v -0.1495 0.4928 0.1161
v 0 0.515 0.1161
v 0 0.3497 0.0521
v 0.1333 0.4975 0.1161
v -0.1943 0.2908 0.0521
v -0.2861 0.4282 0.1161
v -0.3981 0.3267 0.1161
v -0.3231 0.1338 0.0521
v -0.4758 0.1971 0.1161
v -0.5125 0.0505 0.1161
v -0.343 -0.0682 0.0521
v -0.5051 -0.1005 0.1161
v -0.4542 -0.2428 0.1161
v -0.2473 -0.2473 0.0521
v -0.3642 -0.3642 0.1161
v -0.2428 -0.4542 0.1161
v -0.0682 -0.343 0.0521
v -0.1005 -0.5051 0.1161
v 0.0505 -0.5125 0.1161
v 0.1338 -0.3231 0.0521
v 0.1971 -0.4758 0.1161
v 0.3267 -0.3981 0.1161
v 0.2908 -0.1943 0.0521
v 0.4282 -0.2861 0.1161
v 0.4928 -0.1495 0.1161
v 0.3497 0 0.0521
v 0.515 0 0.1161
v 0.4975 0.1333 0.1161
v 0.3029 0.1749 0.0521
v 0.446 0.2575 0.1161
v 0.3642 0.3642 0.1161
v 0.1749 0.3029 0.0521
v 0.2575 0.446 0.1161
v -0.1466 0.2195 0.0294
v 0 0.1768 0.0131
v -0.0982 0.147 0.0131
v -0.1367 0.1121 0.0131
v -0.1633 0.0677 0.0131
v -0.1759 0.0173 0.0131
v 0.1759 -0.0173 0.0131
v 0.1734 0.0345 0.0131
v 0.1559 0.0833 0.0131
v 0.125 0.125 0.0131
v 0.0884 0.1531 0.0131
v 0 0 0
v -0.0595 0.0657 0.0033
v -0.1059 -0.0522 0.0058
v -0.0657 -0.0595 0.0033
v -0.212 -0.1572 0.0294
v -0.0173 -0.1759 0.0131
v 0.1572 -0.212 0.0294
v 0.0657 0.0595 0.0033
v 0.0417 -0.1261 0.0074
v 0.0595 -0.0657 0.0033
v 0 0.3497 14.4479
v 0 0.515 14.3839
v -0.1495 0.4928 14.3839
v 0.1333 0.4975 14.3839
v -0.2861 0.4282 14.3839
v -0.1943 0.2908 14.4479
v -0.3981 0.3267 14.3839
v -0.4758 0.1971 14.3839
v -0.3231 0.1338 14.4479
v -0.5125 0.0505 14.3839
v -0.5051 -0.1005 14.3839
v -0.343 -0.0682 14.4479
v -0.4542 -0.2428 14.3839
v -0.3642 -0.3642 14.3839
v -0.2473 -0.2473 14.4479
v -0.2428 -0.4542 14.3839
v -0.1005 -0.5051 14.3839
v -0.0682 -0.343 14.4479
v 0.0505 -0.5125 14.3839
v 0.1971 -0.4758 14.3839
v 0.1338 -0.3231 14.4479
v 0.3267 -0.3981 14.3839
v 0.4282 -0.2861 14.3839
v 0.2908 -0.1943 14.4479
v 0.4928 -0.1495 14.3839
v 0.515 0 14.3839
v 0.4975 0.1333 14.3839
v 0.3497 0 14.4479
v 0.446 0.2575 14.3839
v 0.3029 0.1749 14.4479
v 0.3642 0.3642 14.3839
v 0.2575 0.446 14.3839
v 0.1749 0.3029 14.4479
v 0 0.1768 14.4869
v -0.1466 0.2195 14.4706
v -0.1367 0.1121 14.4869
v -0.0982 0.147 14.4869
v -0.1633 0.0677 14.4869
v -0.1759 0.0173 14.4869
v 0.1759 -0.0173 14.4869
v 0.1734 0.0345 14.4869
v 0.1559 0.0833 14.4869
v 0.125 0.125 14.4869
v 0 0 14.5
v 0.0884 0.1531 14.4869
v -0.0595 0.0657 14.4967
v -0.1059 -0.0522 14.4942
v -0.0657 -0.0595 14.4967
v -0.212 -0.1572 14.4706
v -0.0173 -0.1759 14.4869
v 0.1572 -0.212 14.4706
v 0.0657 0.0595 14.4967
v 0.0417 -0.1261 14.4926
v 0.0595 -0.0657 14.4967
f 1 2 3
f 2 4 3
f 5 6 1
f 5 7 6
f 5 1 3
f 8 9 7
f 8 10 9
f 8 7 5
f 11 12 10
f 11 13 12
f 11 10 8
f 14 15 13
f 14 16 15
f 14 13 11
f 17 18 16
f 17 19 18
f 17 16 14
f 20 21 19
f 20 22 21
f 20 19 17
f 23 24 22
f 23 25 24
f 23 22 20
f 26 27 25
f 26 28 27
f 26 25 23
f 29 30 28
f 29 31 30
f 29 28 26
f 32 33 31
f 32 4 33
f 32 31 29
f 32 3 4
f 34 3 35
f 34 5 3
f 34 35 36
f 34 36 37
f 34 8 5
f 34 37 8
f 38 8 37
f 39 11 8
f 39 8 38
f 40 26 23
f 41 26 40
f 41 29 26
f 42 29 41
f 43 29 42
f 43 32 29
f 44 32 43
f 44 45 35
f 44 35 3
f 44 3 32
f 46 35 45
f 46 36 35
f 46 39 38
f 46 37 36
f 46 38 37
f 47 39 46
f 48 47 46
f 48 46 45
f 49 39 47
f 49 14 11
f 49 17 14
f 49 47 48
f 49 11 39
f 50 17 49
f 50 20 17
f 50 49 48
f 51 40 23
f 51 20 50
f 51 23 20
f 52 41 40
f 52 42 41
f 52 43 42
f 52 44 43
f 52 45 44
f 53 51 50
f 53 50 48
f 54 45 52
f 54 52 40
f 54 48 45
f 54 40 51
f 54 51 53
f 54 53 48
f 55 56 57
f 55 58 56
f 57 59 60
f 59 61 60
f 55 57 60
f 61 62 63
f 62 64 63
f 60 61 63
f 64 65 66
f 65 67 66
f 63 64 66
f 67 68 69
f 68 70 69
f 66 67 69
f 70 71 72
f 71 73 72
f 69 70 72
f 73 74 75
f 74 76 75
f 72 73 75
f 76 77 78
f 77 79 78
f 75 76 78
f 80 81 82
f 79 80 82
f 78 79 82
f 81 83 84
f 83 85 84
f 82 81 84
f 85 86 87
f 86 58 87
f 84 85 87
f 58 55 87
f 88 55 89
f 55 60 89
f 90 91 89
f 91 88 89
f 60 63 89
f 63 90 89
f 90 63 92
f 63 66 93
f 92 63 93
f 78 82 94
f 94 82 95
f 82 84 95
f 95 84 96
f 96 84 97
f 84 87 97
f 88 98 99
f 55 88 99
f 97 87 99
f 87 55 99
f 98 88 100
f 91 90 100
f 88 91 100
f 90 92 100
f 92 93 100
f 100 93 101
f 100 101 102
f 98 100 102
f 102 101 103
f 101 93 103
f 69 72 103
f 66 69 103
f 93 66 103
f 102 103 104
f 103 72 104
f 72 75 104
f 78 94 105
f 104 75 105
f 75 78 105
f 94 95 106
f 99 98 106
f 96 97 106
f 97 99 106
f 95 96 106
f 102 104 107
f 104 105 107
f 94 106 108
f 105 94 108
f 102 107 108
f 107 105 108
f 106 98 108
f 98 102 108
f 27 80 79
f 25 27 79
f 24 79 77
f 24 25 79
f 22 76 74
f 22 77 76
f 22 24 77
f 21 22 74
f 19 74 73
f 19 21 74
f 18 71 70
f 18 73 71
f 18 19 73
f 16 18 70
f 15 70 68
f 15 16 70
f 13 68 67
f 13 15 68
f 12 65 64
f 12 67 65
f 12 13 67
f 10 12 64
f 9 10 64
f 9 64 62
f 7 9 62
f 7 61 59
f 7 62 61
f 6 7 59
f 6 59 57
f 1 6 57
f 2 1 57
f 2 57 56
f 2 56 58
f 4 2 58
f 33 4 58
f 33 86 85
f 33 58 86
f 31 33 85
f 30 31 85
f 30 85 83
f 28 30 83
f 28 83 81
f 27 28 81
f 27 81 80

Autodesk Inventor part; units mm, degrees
ref_plane "YZ Plane" through (0, 0, 0) normal (1, 0, 0) x (0, 1, 0)
ref_plane "XZ Plane" through (0, 0, 0) normal (0, 1, 0) x (-1, 0, 0)
sketch "Sketch1" plane through (0, 0, 0) normal (0, 0, 1) x (1, 0, 0)
  circle A0 centre (0, 0) radius 0.515
  dimension "d0" = 1.03
extrude "Extrusion1" add sketch "Sketch1" along normal blind 14.5
thread "Thread1" size "110-102 UNM" class "2A" standard "ANSI Unified Screw Threads" full length
sketch "Sketch2" plane through (0, 0, 0) normal (1, 0, 0) x (0, 1, 0)
  line L0 (-0.515, 14.5) -> (0.515, 14.5) projected
  line L1 (-0.515, 0) -> (-0.515, 14.5) projected
  line L2 (0.515, 0) -> (0.515, 14.5) projected
  arc A0 (0, 0) -> (0.515, 0.1161) centre (0, 1.2) ccw
  line L3 (-0.515, 0) -> (0.515, 0) projected
  line L4 (0.515, 0.1161) -> (0.515, 0)
  line L5 (0, 0) -> (0.515, 0)
  line L6 (0, -2.7344) -> (0, 16.2057) projected
  point P0 (0, 0)
  point P1 (0, 0)
revolve "Revolution1" cut sketch "Sketch2" angle 360 about axis through (0, 0, -10) along (0, 0, 1) contours A0 L2 L3
ref_plane "Work Plane_Mid" through (0, 0, 7.25) normal (0, 0, 1) x (1, 0, 0)
mirror "Mirror1" about plane through (0, 0, 7.25) normal (0, 0, 1) of "Revolution1"
ref_plane "Work Plane4" through (0, 0, 14.5) normal (0, 0, 1) x (1, 0, 0)
equation "\"d10\" = 0.5 * d1"
equation "\"d11\" = d1"
equation "\"d1\" = 14.5"
properties part number "Motor_Thread" material "Brass, Soft Yellow"
